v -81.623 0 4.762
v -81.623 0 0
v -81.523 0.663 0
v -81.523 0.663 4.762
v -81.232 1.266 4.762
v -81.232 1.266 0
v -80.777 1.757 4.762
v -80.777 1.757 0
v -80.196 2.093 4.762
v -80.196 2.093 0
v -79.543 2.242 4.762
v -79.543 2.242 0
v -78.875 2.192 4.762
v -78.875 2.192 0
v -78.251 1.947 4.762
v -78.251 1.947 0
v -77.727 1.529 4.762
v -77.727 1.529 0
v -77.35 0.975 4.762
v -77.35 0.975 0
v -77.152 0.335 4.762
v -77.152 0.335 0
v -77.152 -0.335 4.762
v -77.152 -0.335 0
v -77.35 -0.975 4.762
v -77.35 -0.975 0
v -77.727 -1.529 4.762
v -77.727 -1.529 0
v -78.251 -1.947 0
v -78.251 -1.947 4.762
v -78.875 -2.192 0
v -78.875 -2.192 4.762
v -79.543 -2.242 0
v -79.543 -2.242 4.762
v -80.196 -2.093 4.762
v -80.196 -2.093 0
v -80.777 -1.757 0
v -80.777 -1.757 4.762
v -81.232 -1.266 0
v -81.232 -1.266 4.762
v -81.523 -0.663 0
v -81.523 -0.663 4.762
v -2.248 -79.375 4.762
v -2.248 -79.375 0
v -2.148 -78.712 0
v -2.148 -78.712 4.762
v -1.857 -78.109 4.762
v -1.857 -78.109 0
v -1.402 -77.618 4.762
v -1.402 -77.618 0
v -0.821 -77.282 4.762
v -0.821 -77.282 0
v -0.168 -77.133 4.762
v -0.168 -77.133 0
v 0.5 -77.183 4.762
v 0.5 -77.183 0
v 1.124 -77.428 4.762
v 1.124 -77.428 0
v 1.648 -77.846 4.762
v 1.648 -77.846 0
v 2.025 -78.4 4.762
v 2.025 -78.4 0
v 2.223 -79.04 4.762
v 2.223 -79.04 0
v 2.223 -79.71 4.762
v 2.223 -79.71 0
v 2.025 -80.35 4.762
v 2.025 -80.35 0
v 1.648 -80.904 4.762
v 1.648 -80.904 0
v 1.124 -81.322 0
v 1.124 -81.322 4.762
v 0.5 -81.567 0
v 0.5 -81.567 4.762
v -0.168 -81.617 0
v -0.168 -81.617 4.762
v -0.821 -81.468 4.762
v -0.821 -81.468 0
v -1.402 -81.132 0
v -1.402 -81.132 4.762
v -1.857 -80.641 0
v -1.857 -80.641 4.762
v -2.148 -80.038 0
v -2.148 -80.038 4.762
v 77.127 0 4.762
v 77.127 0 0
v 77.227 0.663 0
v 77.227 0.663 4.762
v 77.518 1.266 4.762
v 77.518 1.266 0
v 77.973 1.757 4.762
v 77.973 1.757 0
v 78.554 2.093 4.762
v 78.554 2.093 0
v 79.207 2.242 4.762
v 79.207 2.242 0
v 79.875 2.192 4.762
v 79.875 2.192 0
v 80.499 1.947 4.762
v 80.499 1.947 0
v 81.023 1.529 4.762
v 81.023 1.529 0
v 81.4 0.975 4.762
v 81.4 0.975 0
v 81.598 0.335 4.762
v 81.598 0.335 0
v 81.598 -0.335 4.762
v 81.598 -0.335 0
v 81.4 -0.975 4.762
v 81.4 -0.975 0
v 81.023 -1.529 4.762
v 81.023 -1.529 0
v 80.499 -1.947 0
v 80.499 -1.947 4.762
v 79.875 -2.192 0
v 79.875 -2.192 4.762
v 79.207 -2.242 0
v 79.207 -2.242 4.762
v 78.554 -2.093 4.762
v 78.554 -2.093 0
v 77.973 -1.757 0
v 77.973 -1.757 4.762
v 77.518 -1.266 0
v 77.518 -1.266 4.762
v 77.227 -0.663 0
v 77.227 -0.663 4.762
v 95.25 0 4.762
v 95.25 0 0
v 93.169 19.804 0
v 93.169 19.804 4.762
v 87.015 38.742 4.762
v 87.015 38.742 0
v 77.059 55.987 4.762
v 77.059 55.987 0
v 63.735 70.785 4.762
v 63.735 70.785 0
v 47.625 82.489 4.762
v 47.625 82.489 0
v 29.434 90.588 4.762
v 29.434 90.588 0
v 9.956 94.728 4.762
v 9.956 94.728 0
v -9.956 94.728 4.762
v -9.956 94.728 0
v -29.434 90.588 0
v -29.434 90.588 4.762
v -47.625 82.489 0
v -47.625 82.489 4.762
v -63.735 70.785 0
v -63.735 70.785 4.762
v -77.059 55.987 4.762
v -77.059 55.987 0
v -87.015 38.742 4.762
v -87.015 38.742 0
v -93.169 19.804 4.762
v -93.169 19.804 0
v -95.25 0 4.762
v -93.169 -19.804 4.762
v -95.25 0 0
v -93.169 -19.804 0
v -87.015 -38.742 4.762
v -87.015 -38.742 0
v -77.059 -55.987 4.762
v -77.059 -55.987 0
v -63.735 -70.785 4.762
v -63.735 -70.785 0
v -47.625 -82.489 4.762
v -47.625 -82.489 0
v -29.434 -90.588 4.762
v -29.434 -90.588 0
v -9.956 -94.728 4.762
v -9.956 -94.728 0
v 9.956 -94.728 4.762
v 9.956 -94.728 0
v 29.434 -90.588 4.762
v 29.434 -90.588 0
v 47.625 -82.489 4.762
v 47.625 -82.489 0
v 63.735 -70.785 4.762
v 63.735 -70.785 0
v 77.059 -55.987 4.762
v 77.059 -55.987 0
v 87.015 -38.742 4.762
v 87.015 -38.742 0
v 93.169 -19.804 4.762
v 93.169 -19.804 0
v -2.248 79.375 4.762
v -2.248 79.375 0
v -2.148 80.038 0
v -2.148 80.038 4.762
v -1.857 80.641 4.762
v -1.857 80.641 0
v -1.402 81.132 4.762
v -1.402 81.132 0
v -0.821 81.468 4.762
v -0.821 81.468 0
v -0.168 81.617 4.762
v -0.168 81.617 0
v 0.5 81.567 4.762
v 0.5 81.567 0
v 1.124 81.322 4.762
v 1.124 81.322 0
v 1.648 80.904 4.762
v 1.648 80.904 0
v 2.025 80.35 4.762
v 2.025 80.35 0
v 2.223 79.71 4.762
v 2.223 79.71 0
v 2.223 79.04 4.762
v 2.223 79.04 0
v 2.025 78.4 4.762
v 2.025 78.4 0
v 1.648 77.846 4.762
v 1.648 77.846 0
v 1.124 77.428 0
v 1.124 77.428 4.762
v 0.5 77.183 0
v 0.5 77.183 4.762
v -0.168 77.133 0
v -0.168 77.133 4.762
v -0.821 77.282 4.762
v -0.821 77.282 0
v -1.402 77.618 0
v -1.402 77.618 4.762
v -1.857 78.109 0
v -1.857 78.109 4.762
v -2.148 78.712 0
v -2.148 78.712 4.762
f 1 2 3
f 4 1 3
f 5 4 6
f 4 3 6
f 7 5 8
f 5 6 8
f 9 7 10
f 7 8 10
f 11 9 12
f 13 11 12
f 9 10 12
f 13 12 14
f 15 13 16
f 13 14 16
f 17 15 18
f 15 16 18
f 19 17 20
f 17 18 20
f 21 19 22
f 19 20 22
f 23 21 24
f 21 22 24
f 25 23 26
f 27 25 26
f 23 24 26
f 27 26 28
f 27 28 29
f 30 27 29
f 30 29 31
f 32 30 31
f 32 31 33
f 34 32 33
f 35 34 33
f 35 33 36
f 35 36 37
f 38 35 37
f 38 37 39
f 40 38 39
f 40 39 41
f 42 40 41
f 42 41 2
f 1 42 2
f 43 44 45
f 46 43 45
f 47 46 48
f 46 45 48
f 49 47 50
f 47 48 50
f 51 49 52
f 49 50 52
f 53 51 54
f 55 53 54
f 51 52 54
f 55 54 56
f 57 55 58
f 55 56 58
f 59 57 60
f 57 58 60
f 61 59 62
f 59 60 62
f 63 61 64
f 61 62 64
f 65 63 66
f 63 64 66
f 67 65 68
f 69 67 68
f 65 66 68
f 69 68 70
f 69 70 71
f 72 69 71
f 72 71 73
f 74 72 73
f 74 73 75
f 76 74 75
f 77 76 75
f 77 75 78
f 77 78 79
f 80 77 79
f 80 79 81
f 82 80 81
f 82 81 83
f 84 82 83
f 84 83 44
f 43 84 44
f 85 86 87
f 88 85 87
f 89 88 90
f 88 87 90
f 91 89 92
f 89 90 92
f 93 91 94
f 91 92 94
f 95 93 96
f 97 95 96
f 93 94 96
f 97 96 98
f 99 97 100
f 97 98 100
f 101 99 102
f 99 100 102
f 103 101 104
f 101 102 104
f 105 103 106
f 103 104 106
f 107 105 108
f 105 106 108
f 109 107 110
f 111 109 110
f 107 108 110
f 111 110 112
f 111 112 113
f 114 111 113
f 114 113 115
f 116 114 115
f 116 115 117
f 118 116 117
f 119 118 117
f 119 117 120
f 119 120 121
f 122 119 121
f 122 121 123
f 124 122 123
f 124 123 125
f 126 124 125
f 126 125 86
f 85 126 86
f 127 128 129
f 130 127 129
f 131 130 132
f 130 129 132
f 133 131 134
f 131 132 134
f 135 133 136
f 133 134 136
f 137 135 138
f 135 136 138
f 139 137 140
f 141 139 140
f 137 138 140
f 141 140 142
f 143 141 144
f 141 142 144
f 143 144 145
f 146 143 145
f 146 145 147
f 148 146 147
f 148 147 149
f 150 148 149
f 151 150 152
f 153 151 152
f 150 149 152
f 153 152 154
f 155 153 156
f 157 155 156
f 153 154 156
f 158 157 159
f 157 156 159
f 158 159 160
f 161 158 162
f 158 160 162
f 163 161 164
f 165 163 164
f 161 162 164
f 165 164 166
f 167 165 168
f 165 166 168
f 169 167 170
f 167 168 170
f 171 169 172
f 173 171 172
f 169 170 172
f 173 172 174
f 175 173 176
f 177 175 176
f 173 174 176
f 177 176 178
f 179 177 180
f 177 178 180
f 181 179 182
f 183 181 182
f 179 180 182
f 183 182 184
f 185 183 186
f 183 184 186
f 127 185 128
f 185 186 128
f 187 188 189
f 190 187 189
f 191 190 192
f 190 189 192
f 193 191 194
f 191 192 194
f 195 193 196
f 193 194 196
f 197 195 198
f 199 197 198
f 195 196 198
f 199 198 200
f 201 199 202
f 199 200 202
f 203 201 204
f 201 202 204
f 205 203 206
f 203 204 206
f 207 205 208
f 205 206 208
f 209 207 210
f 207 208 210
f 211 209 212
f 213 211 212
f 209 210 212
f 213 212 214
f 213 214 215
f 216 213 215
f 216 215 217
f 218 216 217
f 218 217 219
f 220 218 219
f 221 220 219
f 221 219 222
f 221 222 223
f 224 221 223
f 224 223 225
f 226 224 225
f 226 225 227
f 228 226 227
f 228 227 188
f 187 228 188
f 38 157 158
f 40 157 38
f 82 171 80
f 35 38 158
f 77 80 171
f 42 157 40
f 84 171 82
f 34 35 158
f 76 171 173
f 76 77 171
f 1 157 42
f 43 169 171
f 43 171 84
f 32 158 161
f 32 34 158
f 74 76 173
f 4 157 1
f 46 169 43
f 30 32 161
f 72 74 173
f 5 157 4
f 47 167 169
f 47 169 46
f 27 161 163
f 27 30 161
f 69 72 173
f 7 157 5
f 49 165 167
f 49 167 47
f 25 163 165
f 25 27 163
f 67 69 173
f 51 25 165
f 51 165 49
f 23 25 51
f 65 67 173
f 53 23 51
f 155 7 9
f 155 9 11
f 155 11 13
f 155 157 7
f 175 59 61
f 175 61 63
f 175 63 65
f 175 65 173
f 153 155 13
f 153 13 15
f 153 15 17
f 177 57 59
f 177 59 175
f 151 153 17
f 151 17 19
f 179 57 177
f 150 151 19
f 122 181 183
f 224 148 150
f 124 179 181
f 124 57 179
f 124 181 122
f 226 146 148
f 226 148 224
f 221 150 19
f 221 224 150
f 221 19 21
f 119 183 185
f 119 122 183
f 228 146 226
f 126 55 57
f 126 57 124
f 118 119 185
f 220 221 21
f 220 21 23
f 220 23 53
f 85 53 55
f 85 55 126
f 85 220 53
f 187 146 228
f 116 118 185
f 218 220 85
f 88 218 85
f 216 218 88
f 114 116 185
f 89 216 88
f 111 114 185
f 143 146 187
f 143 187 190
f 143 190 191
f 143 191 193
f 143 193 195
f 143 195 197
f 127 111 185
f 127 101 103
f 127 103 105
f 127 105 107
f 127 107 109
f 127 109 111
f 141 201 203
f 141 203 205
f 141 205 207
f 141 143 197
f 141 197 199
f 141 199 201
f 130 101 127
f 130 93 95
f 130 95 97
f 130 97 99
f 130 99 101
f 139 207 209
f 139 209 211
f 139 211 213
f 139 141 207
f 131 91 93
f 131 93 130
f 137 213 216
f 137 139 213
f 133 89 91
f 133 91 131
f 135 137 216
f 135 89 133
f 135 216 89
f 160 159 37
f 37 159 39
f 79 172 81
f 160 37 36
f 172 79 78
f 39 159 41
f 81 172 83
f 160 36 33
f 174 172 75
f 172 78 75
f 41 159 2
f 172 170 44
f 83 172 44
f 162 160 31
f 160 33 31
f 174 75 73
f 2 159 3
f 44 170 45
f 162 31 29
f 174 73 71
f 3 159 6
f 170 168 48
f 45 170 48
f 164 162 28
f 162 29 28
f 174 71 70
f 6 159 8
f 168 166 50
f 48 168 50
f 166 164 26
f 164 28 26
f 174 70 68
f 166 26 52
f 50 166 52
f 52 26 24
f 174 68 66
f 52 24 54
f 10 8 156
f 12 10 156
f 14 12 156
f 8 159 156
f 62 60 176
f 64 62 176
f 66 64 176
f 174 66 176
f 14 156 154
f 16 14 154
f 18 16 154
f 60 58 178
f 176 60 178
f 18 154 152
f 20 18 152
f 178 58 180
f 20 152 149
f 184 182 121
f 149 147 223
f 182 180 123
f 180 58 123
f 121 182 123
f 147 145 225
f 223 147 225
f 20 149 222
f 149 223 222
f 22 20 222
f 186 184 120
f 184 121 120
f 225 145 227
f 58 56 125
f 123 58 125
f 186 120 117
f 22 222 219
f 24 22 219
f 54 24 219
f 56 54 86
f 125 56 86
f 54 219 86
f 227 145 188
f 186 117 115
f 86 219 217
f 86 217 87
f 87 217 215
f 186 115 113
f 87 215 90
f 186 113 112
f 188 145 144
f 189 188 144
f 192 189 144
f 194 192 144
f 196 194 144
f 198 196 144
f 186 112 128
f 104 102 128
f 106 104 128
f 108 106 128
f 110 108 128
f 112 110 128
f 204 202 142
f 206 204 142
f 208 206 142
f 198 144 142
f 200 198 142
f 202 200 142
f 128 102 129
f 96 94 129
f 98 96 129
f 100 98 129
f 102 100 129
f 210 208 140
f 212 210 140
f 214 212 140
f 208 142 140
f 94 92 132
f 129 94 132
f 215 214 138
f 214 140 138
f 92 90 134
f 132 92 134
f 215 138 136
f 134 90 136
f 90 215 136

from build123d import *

# Parameters (mm, degrees)
SKETCH1_R                  = 95.25
BOSS_EXTRUDE1_DEPTH        = 4.7625
F_12_24_TAPPED_HOLE1_D     = 4.4958
F_12_24_TAPPED_HOLE1_DEPTH = 14.224


with BuildPart() as part:
    # Sketch1 → Boss-Extrude1 (new body)
    with BuildSketch(Plane.XY):
        Circle(SKETCH1_R)
    extrude(amount=BOSS_EXTRUDE1_DEPTH)

    # #12-24 Tapped Hole1
    with Locations(Plane.XY.offset(4.7625)):
        with Locations((0, 79.375), (-79.375, 0), (79.375, 0), (0, -79.375)):
            Hole(F_12_24_TAPPED_HOLE1_D / 2, depth=F_12_24_TAPPED_HOLE1_DEPTH)


solid = part.part
